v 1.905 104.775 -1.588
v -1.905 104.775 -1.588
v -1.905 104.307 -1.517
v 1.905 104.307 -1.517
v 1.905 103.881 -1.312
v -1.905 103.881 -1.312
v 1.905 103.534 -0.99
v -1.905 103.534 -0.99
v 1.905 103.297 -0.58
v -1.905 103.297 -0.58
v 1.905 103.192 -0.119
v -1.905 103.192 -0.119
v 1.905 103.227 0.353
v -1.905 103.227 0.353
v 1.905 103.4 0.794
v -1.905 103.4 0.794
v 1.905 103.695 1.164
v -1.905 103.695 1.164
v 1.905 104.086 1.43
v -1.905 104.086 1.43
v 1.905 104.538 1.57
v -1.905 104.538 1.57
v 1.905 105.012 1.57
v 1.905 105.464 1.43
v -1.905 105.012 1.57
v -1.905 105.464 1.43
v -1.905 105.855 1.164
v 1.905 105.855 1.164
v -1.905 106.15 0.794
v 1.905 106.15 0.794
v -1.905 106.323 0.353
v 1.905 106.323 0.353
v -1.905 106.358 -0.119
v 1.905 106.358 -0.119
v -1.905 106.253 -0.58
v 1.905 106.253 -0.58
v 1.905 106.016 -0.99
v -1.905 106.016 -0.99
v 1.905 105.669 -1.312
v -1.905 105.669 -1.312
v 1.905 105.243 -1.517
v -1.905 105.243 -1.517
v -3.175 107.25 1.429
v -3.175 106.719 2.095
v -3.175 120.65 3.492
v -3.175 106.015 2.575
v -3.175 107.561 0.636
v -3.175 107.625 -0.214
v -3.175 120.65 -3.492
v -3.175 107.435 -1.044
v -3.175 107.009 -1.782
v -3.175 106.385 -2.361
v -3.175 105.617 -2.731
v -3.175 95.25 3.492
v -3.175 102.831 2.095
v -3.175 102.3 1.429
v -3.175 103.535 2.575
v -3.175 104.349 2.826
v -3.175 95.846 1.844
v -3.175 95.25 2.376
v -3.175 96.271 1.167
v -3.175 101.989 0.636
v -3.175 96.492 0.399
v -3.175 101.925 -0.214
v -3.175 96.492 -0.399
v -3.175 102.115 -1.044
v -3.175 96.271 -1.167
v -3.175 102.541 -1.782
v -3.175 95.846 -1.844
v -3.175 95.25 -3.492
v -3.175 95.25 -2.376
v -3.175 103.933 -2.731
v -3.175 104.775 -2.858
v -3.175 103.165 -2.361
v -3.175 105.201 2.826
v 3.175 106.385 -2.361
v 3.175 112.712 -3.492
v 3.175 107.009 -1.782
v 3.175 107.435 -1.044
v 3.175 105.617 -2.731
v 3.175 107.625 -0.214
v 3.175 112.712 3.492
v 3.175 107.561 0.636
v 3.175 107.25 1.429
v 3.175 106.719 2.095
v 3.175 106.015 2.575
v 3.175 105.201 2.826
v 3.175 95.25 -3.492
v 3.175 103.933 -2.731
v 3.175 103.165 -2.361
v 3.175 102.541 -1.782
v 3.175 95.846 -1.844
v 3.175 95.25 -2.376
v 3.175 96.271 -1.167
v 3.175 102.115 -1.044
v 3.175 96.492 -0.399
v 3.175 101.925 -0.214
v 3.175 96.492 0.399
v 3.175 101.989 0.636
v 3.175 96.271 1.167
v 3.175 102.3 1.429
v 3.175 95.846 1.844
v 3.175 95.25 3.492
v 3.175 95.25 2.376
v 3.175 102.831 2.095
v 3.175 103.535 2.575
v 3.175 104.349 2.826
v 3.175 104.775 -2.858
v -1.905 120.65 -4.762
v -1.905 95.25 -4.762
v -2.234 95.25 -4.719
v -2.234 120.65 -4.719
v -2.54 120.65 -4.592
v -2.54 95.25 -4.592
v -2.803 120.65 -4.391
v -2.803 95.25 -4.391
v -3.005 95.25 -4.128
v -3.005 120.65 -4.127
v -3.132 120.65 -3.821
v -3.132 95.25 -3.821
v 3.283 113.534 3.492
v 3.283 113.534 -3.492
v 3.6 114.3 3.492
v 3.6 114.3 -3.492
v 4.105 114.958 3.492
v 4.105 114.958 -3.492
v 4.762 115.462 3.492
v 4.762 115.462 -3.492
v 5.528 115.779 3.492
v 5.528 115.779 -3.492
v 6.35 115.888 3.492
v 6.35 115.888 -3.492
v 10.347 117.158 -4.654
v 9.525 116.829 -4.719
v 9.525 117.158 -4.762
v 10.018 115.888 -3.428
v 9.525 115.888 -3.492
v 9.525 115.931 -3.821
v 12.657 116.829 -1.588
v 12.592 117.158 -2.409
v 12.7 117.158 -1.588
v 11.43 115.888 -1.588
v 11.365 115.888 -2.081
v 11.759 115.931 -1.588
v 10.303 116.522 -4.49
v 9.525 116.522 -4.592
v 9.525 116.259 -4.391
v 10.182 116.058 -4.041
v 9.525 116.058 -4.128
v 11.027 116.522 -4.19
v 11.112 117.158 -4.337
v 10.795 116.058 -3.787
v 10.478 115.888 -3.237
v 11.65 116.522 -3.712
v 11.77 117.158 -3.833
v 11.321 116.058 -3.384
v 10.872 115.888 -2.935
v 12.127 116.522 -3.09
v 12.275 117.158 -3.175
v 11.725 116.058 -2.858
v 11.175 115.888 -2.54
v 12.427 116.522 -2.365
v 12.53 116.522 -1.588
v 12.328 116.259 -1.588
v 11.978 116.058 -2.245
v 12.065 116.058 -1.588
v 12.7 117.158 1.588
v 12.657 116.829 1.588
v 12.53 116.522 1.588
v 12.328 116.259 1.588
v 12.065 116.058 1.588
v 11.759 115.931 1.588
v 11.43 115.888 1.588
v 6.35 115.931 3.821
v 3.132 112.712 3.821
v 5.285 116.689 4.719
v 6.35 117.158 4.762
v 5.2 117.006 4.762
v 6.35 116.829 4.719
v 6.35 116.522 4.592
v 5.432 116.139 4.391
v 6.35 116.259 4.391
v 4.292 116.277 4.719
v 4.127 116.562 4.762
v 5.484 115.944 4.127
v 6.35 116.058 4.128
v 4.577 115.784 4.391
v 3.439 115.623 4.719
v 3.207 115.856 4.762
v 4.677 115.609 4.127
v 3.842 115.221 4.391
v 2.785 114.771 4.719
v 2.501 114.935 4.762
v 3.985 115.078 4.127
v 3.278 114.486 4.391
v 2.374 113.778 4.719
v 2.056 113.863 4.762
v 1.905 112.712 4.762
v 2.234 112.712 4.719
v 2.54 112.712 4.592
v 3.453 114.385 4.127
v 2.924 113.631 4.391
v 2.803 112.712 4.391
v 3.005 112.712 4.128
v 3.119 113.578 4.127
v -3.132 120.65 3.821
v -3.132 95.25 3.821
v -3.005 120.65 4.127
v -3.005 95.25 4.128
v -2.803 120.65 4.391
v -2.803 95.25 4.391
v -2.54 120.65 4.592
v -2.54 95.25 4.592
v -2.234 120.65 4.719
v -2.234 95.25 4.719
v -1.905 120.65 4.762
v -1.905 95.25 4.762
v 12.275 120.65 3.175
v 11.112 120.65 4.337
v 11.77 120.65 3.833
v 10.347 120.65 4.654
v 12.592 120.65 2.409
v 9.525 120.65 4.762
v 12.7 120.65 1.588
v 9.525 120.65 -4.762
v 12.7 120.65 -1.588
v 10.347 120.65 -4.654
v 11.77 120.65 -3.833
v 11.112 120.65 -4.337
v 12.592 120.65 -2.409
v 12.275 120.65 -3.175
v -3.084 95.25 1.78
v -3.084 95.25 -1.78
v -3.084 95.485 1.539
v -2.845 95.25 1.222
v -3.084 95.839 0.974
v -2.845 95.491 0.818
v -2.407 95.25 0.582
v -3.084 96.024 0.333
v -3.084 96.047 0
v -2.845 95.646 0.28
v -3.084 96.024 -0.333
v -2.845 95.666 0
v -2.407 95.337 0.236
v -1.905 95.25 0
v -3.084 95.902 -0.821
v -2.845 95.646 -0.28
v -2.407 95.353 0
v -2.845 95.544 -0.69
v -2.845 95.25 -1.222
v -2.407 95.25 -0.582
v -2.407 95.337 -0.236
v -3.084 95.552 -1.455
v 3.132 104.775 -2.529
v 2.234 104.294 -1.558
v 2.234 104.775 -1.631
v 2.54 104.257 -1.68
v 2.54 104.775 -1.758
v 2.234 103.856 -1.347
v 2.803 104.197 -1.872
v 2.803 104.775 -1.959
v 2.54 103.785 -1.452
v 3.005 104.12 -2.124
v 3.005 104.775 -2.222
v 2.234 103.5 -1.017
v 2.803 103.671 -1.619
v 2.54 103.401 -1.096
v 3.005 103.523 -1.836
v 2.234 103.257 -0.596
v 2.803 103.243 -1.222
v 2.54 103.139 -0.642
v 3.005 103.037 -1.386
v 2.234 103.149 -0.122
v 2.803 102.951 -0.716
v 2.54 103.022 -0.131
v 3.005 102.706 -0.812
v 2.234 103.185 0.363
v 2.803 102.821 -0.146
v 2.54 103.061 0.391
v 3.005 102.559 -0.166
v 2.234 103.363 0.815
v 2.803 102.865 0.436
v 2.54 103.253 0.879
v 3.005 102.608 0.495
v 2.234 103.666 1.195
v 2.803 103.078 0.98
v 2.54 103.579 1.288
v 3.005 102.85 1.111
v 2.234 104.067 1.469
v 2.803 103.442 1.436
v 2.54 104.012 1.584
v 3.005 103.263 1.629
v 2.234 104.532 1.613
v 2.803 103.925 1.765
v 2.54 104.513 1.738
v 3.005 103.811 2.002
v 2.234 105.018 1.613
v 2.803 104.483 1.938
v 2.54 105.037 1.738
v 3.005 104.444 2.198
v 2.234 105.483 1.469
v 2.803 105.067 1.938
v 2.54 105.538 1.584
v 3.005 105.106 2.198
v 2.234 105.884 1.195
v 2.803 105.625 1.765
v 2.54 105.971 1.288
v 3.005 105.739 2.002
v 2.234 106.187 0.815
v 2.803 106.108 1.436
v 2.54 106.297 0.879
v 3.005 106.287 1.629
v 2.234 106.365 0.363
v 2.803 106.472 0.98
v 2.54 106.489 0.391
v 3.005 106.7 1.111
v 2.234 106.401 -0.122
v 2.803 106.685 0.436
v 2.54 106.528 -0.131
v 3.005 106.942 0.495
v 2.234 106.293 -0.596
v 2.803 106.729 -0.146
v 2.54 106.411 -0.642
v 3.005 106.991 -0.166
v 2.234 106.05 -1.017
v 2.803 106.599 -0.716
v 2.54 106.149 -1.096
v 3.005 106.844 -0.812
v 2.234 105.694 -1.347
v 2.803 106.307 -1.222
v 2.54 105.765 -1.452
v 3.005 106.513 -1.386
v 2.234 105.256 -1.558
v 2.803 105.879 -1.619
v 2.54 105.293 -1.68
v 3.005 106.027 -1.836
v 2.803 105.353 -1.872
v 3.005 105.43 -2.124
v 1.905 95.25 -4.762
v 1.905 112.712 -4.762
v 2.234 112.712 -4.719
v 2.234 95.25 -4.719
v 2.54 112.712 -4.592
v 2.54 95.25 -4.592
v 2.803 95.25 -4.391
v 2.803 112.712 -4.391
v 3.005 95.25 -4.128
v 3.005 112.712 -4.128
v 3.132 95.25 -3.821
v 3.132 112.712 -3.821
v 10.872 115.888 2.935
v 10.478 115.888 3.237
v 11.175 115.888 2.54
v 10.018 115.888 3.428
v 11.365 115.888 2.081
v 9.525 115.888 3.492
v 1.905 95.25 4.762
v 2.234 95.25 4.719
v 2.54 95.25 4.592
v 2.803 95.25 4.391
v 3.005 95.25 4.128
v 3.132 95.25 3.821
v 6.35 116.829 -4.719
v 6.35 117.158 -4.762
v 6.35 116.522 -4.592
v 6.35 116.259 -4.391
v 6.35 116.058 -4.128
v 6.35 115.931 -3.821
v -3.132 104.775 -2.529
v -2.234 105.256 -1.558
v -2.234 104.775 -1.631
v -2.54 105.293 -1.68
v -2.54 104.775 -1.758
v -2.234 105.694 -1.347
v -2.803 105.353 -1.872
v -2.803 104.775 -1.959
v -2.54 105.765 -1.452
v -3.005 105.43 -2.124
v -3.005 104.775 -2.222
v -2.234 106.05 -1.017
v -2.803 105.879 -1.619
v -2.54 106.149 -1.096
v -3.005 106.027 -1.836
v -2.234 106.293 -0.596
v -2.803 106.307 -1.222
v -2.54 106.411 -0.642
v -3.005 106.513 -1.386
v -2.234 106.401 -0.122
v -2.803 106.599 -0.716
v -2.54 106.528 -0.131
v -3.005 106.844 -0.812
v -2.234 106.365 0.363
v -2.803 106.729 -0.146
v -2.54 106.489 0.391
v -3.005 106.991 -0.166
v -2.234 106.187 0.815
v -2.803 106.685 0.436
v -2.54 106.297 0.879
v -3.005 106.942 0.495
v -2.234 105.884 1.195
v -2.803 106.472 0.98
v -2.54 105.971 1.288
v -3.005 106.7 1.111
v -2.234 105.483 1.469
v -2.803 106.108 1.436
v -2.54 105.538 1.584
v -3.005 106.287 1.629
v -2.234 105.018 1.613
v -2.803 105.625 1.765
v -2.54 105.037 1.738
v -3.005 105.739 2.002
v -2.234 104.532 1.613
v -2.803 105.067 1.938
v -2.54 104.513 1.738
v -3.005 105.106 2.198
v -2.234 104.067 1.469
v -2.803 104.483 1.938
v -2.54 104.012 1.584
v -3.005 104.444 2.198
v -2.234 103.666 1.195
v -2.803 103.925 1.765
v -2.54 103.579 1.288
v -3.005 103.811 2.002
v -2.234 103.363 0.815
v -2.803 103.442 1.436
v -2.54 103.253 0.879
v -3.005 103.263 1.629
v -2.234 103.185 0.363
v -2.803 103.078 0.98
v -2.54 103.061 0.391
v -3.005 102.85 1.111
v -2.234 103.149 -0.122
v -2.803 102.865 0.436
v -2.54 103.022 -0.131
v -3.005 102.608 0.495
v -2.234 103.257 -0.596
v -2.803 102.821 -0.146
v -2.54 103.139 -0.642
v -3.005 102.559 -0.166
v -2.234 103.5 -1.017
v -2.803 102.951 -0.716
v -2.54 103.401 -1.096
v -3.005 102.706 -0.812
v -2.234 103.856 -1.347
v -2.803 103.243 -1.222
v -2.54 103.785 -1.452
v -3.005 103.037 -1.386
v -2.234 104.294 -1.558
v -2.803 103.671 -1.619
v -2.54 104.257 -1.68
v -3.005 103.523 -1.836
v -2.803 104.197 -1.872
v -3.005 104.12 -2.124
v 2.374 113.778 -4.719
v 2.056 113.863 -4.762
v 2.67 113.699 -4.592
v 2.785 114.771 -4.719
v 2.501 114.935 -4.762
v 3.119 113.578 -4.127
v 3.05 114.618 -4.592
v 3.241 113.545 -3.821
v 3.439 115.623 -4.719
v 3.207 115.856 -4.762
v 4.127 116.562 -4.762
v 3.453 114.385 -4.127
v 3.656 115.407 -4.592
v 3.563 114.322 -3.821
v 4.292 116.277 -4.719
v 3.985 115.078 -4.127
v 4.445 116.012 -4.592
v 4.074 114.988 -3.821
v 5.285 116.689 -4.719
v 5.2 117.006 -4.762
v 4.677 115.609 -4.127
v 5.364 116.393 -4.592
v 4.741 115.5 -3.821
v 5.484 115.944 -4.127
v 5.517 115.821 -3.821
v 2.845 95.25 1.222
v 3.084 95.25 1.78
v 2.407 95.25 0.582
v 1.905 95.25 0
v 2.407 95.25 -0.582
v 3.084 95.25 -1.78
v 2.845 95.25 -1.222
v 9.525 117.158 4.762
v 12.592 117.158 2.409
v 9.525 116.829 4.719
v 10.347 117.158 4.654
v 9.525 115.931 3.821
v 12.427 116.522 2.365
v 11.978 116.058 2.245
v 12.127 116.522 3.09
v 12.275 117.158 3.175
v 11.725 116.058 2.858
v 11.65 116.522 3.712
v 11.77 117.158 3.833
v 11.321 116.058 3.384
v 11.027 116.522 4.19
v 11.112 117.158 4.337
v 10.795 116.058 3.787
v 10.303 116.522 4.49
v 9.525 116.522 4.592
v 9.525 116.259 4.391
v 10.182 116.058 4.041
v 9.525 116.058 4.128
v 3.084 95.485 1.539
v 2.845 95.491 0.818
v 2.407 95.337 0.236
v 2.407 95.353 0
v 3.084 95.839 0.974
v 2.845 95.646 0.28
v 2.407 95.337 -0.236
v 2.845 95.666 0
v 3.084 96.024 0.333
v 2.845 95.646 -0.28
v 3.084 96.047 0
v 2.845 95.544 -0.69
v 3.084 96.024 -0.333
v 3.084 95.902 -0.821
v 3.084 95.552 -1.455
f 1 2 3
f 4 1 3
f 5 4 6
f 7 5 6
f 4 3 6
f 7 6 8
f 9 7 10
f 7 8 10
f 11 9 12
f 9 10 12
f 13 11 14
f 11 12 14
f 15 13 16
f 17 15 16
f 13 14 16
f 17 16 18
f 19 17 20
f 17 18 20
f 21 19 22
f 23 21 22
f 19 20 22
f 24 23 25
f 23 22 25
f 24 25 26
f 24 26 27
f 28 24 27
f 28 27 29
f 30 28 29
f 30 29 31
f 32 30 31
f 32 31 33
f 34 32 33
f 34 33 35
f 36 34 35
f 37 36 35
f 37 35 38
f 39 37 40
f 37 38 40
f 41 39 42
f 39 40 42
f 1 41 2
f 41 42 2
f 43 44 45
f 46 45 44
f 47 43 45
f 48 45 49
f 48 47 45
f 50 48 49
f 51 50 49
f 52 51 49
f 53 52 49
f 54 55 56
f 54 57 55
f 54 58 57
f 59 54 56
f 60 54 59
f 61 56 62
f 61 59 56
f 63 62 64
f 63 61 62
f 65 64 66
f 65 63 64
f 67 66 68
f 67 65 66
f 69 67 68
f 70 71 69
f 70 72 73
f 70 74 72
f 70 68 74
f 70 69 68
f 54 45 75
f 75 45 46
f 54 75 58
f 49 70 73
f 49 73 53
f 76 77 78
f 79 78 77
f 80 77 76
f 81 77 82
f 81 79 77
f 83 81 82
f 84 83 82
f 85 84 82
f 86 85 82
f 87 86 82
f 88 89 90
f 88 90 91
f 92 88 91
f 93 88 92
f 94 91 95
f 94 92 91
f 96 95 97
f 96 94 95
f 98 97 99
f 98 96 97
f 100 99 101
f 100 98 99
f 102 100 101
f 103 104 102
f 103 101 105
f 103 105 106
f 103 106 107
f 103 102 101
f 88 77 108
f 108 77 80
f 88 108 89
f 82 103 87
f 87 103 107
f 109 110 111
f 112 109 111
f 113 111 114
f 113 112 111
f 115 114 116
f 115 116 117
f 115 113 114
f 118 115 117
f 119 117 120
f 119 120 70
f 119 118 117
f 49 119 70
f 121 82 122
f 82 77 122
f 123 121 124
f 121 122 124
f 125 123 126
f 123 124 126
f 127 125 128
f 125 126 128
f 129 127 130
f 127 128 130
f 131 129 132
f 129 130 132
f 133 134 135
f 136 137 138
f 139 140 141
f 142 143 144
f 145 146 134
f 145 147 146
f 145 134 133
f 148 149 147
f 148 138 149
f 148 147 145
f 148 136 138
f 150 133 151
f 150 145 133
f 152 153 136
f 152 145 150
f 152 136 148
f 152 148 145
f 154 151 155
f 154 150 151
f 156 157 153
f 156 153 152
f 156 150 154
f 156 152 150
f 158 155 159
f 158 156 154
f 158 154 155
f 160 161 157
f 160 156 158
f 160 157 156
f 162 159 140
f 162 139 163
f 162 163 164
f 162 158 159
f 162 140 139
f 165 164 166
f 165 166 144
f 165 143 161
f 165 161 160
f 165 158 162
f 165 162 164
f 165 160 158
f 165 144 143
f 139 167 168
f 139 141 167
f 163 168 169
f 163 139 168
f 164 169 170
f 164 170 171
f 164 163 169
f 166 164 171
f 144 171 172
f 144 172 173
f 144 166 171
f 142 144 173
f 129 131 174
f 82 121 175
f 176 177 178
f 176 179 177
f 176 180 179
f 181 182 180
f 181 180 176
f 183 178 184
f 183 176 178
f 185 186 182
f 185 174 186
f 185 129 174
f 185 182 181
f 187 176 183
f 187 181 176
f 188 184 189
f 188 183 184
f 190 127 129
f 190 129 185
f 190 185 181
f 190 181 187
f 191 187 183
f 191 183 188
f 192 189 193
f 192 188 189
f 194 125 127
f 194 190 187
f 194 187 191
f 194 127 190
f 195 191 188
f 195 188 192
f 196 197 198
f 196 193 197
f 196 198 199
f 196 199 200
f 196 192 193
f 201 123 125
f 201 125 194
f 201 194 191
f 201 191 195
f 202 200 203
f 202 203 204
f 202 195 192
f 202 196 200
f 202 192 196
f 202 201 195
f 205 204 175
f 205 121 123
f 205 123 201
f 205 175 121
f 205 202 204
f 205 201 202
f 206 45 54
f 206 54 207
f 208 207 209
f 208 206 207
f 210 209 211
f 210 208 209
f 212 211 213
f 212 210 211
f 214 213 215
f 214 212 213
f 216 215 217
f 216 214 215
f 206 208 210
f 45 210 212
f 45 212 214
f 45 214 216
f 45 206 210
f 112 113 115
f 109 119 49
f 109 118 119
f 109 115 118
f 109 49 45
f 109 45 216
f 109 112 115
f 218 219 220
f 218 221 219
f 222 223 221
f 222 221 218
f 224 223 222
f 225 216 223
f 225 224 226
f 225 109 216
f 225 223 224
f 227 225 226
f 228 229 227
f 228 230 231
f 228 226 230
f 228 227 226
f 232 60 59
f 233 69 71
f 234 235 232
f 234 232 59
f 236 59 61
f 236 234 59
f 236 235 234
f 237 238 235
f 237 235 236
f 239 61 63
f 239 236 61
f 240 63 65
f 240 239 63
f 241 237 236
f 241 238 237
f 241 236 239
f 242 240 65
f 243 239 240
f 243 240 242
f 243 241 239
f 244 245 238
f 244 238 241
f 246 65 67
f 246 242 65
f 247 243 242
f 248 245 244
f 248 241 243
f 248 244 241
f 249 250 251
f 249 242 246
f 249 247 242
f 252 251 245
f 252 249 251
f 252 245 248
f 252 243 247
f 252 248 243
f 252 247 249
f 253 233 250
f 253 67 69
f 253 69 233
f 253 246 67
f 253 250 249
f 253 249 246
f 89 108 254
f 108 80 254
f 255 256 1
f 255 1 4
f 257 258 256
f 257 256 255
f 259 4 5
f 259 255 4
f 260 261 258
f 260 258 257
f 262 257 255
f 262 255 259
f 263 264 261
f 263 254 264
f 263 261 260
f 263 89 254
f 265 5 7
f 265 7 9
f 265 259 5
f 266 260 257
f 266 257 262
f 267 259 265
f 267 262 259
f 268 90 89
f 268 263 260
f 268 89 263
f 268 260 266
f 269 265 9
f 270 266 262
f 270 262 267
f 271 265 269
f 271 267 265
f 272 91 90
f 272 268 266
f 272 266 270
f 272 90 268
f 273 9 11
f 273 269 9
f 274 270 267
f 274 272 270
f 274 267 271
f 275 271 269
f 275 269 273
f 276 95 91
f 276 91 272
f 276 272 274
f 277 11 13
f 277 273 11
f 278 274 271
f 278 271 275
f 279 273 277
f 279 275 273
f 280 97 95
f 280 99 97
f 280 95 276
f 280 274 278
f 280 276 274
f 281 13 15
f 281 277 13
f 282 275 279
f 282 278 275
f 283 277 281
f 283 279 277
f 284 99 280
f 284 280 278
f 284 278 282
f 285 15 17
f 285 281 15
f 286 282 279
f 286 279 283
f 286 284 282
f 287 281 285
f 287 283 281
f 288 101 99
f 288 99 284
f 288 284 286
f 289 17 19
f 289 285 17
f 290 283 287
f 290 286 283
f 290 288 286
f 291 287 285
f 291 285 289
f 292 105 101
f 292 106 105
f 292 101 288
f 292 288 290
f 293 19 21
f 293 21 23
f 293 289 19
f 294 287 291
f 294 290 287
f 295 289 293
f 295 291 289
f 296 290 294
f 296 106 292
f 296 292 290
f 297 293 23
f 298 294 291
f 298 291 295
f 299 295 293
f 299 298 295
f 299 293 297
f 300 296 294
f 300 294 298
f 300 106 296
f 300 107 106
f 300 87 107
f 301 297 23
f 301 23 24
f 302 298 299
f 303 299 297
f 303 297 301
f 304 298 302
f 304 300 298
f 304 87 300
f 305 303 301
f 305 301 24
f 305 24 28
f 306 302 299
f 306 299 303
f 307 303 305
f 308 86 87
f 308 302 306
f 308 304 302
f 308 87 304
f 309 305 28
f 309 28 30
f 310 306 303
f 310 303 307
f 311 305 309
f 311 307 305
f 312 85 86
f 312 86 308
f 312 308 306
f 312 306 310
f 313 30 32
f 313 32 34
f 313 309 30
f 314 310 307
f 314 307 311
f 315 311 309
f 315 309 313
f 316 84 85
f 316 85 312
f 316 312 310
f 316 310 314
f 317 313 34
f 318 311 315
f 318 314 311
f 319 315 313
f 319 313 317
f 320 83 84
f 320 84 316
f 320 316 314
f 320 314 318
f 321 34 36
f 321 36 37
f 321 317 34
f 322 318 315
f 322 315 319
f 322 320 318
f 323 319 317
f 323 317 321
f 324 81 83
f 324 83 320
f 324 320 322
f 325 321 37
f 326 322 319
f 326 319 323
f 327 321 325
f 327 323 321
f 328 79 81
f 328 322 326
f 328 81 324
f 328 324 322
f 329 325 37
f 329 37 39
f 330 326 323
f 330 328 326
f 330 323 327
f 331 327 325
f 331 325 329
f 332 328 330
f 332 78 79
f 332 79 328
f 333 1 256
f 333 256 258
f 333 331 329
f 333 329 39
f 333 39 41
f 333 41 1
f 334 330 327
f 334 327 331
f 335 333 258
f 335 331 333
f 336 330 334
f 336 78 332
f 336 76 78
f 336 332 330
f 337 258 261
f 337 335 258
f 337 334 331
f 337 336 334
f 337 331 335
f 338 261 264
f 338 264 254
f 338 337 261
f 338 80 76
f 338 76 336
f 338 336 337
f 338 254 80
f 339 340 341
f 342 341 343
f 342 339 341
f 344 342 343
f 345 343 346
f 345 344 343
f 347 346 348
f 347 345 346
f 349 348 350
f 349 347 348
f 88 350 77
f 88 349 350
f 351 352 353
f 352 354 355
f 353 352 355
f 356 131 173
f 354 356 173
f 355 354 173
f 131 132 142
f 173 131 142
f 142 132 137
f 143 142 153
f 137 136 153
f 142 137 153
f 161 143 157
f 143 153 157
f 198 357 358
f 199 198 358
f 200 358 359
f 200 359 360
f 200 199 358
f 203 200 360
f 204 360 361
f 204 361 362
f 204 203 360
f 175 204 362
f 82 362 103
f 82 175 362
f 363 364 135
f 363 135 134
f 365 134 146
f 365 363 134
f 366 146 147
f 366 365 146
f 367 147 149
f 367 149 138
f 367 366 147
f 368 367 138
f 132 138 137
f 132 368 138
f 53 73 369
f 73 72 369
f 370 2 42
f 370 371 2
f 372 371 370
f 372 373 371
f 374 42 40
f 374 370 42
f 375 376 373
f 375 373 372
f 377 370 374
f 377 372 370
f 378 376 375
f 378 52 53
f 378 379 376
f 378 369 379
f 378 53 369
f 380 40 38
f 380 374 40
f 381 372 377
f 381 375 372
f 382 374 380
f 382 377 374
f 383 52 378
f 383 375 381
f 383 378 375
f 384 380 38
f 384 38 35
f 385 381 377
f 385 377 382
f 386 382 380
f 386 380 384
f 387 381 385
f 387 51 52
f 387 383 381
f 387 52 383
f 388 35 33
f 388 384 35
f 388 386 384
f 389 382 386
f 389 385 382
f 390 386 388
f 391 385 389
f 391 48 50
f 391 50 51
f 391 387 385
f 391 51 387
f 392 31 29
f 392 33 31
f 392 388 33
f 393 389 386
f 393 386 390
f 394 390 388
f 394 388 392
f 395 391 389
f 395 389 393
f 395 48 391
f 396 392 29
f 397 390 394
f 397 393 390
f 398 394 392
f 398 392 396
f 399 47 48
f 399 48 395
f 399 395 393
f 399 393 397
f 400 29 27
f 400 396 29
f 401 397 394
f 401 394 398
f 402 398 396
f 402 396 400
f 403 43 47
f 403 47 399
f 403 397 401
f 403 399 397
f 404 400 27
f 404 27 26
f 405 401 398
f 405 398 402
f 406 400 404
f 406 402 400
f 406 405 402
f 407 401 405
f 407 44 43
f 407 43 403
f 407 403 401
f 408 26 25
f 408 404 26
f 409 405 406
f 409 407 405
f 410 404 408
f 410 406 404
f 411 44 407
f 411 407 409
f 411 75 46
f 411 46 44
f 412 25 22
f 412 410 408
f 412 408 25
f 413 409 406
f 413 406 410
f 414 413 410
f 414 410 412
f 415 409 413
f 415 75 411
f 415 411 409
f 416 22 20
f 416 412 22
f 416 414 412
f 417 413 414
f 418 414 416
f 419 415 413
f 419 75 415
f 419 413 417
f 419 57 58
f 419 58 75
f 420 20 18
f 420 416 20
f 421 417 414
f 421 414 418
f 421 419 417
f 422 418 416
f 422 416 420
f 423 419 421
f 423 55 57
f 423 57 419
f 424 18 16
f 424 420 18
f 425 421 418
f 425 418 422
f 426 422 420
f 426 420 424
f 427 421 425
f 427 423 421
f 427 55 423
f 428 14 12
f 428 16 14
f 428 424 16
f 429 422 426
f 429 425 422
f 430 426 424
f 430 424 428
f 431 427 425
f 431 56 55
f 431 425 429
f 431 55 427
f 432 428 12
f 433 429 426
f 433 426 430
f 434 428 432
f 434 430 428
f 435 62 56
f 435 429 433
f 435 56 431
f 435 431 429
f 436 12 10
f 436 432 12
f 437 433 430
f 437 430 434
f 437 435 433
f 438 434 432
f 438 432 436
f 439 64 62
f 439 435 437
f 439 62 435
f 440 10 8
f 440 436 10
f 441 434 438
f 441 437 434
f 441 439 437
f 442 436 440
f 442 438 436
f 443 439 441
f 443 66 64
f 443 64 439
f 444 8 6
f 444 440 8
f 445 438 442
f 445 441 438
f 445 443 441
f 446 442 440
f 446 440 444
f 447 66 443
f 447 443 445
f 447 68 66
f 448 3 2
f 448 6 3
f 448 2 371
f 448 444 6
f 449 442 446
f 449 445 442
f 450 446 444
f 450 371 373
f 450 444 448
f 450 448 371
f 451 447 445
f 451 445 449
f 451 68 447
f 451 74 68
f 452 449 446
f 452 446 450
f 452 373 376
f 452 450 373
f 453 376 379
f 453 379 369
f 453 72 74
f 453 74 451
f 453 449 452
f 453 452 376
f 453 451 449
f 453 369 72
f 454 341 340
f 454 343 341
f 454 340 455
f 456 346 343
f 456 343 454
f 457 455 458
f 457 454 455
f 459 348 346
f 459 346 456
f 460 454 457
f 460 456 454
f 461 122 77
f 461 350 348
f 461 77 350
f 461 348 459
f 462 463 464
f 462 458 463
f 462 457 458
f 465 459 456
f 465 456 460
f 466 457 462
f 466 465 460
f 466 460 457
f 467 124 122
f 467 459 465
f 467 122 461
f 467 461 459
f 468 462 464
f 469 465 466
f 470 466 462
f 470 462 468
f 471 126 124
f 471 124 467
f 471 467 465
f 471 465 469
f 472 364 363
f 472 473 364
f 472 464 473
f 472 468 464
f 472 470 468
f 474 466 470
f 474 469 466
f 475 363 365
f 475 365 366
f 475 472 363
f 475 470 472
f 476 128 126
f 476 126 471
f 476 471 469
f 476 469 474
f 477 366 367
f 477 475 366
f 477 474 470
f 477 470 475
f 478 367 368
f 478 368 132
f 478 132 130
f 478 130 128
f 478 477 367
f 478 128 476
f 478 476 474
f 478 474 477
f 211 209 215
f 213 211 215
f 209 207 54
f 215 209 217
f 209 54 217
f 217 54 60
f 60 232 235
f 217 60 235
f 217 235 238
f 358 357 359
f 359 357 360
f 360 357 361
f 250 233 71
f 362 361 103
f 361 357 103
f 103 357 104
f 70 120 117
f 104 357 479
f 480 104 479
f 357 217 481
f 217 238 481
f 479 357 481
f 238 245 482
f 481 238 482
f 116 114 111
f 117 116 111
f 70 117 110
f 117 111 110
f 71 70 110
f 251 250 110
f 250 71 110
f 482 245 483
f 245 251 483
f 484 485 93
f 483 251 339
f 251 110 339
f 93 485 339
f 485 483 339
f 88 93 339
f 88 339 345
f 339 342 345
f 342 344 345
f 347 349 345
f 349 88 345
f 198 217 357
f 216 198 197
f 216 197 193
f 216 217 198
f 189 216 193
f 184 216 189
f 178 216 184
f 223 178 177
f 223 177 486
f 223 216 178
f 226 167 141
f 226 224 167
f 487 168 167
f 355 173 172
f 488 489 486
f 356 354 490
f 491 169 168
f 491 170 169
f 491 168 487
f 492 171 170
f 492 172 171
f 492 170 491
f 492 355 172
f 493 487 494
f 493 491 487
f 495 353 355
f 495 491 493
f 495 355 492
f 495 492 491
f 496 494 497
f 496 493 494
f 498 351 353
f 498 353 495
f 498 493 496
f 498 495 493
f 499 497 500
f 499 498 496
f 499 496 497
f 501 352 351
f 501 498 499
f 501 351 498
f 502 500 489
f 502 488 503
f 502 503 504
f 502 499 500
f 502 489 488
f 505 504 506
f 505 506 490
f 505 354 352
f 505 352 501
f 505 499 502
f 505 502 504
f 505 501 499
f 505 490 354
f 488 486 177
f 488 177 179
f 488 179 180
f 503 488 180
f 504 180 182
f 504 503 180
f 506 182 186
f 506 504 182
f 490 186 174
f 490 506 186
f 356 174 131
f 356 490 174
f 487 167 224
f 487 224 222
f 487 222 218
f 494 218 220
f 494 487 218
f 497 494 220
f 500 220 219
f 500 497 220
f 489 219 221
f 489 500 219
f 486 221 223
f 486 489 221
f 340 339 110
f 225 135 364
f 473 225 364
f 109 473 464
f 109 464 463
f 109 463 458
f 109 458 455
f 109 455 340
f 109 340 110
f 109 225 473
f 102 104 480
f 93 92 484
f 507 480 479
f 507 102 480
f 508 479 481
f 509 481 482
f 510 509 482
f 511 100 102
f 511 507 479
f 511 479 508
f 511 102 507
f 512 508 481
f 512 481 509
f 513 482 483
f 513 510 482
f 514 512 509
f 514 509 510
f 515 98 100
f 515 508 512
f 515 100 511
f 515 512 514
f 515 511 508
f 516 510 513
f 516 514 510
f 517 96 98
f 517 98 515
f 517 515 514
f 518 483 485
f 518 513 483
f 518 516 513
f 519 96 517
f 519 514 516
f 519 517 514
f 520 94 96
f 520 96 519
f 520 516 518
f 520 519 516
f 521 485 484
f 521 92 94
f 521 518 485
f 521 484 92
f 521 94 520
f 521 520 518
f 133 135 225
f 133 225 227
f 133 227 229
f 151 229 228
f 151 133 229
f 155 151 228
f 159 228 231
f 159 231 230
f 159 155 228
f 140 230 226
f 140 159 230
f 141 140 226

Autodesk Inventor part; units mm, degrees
ref_plane "YZ Plane" through (0, 0, 0) normal (1, 0, 0) x (0, 1, 0)
ref_plane "XZ Plane" through (0, 0, 0) normal (0, 1, 0) x (-1, 0, 0)
ref_plane "XY Plane" through (0, 0, 0) normal (0, 0, 1) x (1, 0, 0)
sketch "Sketch1" plane through (0, 0, 0) normal (0, 1, 0) x (-1, 0, 0)
  line L0 (3.175, -4.7625) -> (-3.175, -4.7625)
  line L1 (-3.175, -4.7625) -> (-3.175, 4.7625)
  line L2 (-3.175, 4.7625) -> (3.175, 4.7625)
  line L3 (3.175, 4.7625) -> (3.175, -4.7625)
  line L4 (3.175, -4.7625) -> (-3.175, 4.7625) construction
  line L5 (-3.175, -4.7625) -> (3.175, 4.7625) construction
  point P0 (0, 0)
  point P1 (0, 0)
  point P2 (0, 0)
  point P3 (0, 0)
  dimension "d0" = 9.525
  dimension "d1" = 6.35
extrude "Extrusion1" add sketch "Sketch1" along normal blind 120.65
sketch "Sketch2" plane through (0, 0, 0) normal (0, -1, 0) x (1, 0, 0)
  line L0 (3.175, 4.7625) -> (12.7, 4.7625)
  line L1 (12.7, 4.7625) -> (12.7, -4.7625)
  line L2 (12.7, -4.7625) -> (3.175, -4.7625)
  line L3 (3.175, -4.7625) -> (3.175, 4.7625)
  point P0 (0, 0)
  dimension "d4" = 9.525
extrude "Extrusion2" add sketch "Sketch2" against normal blind 4.7625
sketch "Sketch3" plane through (0, 120.65, 0) normal (0, 1, 0) x (1, 0, 0)
  line L0 (3.175, -4.7625) -> (3.175, 4.7625) projected
  line L1 (3.175, -4.7625) -> (12.7, -4.7625) projected
  line L2 (12.7, -4.7625) -> (12.7, 4.7625) projected
  line L3 (12.7, 4.7625) -> (3.175, 4.7625) projected
  point P0 (0, 0)
extrude "Extrusion3" add sketch "Sketch3" against normal blind 4.7625
fillet "Fillet1" radius 3.175 4 edges at (12.7, 2.3813, -4.7625) (12.7, 2.3813, 4.7625) (12.7, 118.2687, -4.7625) (12.7, 118.2687, 4.7625)
fillet "Fillet2" radius 3.175 2 edges at (3.175, 4.7625, 0) (3.175, 115.8875, 0)
fillet "Fillet3" radius 1.27 12 edges at (7.9375, 115.8875, -4.7625) (11.7701, 115.8875, -3.8326) (12.7, 115.8875, 0) (11.7701, 115.8875, 3.8326) (7.9375, 115.8875, 4.7625) (3.175, 60.325, 4.7625) (7.9375, 4.7625, 4.7625) (11.7701, 4.7625, 3.8326) (12.7, 4.7625, 0) (11.7701, 4.7625, -3.8326) (7.9375, 4.7625, -4.7625) (3.175, 60.325, -4.7625)
sketch "Sketch7" plane through (3.175, 7.9375, 3.4925) normal (1, 0, 0) x (0, 0, -1)
  line L0 (0, 0) -> (0, 104.775) projected
  line L1 (5.08, -7.9375) -> (1.905, -7.9375) projected
  line L2 (0, 52.3875) -> (19.363, 52.3875)
  point P0 (3.4925, -7.9375)
  point P1 (3.4925, 7.9375)
  point P2 (3.4925, 30.1625)
  point P3 (3.4925, 52.3875)
  point P4 (3.4925, 96.8375)
  point P5 (3.4925, 74.6125)
  point P6 (3.4925, 19.05)
  point P7 (3.4925, 41.275)
  point P8 (3.4925, 85.725)
  point P9 (3.4925, 63.5)
  dimension "d25" = 15.875
  dimension "d26" = 22.225
  dimension "d27" = 11.1125
  dimension "d28" = 11.1125
hole "Hole2" at (3.175, 15.875, 0) at (3.175, 38.1, 0) at (3.175, 60.325, 0) at (3.175, 82.55, 0) at (3.175, 104.775, 0) at (3.175, 26.9875, 0) at (3.175, 49.2125, 0) at (3.175, 93.6625, 0) at (3.175, 71.4375, 0) direction (-1, 0, 0) diameter 3.175 depth 203.2 tip angle 118
fillet "Fillet4" radius 1.27 9 edges at (3.175, 104.775, 1.5875) (3.175, 93.6625, 1.5875) (3.175, 82.55, 1.5875) (3.175, 71.4375, 1.5875) (3.175, 60.325, 1.5875) (3.175, 49.2125, 1.5875) (3.175, 38.1, 1.5875) (3.175, 26.9875, 1.5875) (3.175, 15.875, 1.5875)
fillet "Fillet5" radius 1.27 9 edges at (-3.175, 104.775, 1.5875) (-3.175, 93.6625, 1.5875) (-3.175, 82.55, 1.5875) (-3.175, 71.4375, 1.5875) (-3.175, 60.325, 1.5875) (-3.175, 49.2125, 1.5875) (-3.175, 38.1, 1.5875) (-3.175, 26.9875, 1.5875) (-3.175, 15.875, 1.5875)
fillet "Fillet6" radius 1.27 2 edges at (-3.175, 60.325, -4.7625) (-3.175, 60.325, 4.7625)
sketch "Sketch4" plane through (0, 120.65, 0) normal (0, 1, 0) x (1, 0, 0)
  line L0 (12.7, -1.5875) -> (12.7, 1.5875) projected
  point P0 (0, 0)
  point P1 (7.62, 0)
  point P2 (12.7, 0)
  dimension "d11" = 5.08
ref_plane "Work Plane3" through (0, 95.25, 0) normal (0, 1, 0) x (1, 0, 0)
sketch "Sketch11" plane through (0, 95.25, 0) normal (0, 1, 0) x (1, 0, 0)
  line L0 (-3.175, 4.7625) -> (12.7, 4.7625)
  line L1 (12.7, 4.7625) -> (12.7, -4.7625)
  line L2 (12.7, -4.7625) -> (-3.175, -4.7625)
  line L3 (-3.175, -4.7625) -> (-3.175, 4.7625)
  arc A0 (-3.175, -3.4925) -> (-1.905, -4.7625) centre (-1.905, -3.4925) ccw projected
  line L4 (-3.175, -3.4925) -> (-3.175, 3.4925) projected
  arc A1 (-1.905, 4.7625) -> (-3.175, 3.4925) centre (-1.905, 3.4925) ccw projected
  line L5 (-1.905, 4.7625) -> (9.525, 4.7625) projected
  arc A2 (12.7, 1.5875) -> (9.525, 4.7625) centre (9.525, 1.5875) ccw projected
  line L6 (12.7, 1.5875) -> (12.7, -1.5875) projected
  arc A3 (9.525, -4.7625) -> (12.7, -1.5875) centre (9.525, -1.5875) ccw projected
  line L7 (9.525, -4.7625) -> (-1.905, -4.7625) projected
  point P0 (0, 0)
extrude "Extrusion10" cut sketch "Sketch11" against normal through all contours L0 A2 L1 A3 L2 A0 L3 A1
properties part number "LidSupportLW"
